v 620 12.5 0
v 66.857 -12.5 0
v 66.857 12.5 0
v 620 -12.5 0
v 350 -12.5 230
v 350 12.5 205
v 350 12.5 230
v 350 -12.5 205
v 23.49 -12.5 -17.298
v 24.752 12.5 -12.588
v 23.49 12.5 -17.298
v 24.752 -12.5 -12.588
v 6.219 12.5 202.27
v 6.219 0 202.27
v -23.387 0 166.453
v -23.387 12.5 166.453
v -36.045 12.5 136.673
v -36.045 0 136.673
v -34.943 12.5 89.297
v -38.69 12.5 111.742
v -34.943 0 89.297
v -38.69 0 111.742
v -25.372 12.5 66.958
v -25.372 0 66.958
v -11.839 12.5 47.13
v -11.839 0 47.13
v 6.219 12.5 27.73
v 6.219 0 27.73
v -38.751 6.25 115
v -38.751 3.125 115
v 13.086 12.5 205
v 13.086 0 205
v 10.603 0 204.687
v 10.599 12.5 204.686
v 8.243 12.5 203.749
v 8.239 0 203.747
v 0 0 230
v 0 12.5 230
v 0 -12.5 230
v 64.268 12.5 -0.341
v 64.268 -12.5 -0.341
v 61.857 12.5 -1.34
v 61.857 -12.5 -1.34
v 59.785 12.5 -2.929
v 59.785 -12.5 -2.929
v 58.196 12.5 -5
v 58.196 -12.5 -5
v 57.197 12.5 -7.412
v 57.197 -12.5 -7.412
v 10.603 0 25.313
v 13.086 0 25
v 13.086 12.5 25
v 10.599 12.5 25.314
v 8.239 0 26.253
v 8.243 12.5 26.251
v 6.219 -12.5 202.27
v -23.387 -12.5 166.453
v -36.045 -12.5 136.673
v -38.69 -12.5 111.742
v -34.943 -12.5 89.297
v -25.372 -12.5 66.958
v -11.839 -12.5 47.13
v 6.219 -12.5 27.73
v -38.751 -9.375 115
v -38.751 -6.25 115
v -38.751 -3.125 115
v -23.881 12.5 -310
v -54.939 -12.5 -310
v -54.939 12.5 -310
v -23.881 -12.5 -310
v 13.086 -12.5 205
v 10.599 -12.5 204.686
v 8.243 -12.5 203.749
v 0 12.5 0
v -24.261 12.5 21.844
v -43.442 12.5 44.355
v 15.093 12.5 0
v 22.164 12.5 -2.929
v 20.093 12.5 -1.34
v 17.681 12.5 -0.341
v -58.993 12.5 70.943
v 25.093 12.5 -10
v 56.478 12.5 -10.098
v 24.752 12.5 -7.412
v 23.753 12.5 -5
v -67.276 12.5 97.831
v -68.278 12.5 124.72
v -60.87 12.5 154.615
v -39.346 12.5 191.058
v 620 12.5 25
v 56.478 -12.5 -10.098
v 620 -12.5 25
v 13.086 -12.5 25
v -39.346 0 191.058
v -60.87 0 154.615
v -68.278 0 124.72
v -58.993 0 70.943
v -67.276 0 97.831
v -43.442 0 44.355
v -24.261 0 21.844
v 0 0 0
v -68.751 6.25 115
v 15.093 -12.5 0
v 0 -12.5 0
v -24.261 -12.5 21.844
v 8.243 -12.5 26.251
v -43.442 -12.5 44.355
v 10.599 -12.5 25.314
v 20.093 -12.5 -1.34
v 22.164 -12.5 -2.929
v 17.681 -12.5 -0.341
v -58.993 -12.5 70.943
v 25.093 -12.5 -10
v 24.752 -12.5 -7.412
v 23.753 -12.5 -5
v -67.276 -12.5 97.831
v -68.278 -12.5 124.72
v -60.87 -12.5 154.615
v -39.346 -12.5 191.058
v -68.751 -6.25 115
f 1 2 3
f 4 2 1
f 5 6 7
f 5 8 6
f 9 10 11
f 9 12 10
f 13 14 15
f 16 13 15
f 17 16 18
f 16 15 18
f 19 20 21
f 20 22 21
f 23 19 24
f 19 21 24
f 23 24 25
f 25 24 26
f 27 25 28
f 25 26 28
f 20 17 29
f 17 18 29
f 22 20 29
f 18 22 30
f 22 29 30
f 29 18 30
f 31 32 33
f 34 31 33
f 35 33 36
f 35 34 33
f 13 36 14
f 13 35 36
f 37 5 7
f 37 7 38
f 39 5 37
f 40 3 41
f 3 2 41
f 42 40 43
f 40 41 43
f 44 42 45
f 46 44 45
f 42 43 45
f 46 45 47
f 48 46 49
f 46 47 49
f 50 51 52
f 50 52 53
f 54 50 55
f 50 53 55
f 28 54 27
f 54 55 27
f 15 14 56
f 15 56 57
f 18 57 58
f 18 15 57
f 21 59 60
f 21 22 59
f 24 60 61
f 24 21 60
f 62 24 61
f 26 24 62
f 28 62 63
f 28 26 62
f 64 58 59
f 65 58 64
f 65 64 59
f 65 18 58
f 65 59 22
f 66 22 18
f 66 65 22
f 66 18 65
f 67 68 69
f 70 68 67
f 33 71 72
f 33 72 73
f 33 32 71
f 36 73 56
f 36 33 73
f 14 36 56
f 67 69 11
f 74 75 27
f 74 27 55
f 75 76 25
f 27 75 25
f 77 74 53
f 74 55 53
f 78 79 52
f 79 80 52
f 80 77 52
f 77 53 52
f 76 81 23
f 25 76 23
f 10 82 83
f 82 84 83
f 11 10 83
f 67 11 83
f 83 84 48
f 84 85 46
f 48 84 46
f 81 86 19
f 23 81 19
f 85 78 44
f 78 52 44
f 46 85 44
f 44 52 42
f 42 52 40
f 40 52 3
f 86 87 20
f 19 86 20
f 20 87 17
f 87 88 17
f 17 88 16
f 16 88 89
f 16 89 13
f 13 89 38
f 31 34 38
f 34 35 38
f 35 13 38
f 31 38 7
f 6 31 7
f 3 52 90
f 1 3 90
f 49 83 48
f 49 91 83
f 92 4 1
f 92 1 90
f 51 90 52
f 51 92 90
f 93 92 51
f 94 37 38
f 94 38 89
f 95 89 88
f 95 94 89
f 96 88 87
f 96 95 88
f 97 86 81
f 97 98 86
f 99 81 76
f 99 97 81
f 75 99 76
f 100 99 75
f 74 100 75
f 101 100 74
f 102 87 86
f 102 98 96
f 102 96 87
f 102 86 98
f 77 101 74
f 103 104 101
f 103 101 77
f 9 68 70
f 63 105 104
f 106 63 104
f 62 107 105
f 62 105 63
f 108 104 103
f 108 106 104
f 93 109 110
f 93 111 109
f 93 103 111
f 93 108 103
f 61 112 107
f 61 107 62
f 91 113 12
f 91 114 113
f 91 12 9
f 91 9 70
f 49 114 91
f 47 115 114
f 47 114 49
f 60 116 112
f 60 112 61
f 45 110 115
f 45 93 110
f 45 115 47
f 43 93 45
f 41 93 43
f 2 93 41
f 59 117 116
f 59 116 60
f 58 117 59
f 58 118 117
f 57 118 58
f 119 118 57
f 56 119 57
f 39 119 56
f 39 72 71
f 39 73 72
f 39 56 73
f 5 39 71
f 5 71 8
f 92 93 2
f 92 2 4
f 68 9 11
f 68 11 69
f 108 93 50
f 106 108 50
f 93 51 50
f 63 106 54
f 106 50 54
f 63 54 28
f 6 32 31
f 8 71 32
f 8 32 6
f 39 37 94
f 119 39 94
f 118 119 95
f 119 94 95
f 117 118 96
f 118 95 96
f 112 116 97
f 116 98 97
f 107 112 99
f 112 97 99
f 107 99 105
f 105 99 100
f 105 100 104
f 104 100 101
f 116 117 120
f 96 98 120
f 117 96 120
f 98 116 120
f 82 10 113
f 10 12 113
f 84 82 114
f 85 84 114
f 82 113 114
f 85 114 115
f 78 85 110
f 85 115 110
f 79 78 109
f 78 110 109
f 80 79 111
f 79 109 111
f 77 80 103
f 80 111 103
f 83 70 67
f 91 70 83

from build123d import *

# Parameters (mm, degrees)
F1_DEPTH = 12.5
F2_R     = 10


with BuildPart() as f1:
    # F0 (on Front) → F1 (new body, symmetric)
    with BuildSketch(Plane.XZ):
        with BuildLine():
            Line((350, 230), (40.9729498071, 230))
            add(Edge.make_bspline(
                [(40.9729498071, 230), (23.1266754436, 217.7466324391), (9.1600259417, 205)],
                knots=[5.8517425134, 5.8517425134, 5.8517425134, 5.949769397, 5.949769397, 5.949769397], degree=2, weights=[1, 0.9987990817, 1]))
            Line((9.1600259417, 205), (350, 205))
            Line((350, 205), (350, 230))
        make_face()
        with BuildLine():
            add(Edge.make_bspline(
                [(-68.7509398502, 115), (-68.7509398502, 55.2165740433), (0, 0)],
                knots=[0, 0, 0, 0.393402632, 0.393402632, 0.393402632], degree=2, weights=[1, 0.9807165918, 1]))
            Line((0, 0), (28.125, 0))
            Line((28.125, 0), (40.9729498071, 0))
            add(Edge.make_bspline(
                [(9.1600259417, 25), (23.1266754436, 12.2533675609), (40.9729498071, 0)],
                knots=[0.3334159102, 0.3334159102, 0.3334159102, 0.4314427937, 0.4314427937, 0.4314427937], degree=2, weights=[1, 0.9987990817, 1]))
            add(Edge.make_bspline(
                [(-38.7509398502, 115), (-38.7509398502, 68.7258392336), (9.1600259417, 25)],
                knots=[0, 0, 0, 0.3334159102, 0.3334159102, 0.3334159102], degree=2, weights=[1, 0.9861363811, 1]))
            add(Edge.make_bspline(
                [(9.1600259417, 205), (-38.7509398502, 161.2741607664), (-38.7509398502, 115)],
                knots=[5.949769397, 5.949769397, 5.949769397, 6.2831853072, 6.2831853072, 6.2831853072], degree=2, weights=[1, 0.9861363811, 1]))
            add(Edge.make_bspline(
                [(40.9729498071, 230), (23.1266754436, 217.7466324391), (9.1600259417, 205)],
                knots=[5.8517425134, 5.8517425134, 5.8517425134, 5.949769397, 5.949769397, 5.949769397], degree=2, weights=[1, 0.9987990817, 1]))
            Line((40.9729498071, 230), (0, 230))
            add(Edge.make_bspline(
                [(0, 230), (-68.7509398502, 174.7834259567), (-68.7509398502, 115)],
                knots=[5.8897826752, 5.8897826752, 5.8897826752, 6.2831853072, 6.2831853072, 6.2831853072], degree=2, weights=[1, 0.9807165918, 1]))
        make_face()
        with BuildLine():
            add(Edge.make_bspline(
                [(9.1600259417, 25), (23.1266754436, 12.2533675609), (40.9729498071, 0)],
                knots=[0.3334159102, 0.3334159102, 0.3334159102, 0.4314427937, 0.4314427937, 0.4314427937], degree=2, weights=[1, 0.9987990817, 1]))
            Line((40.9729498071, 0), (59.1832854123, 0))
            Line((59.1832854123, 0), (620, 0))
            Line((620, 0), (620, 25))
            Line((620, 25), (9.1600259417, 25))
        make_face()
        with BuildLine():
            Line((40.9729498071, 0), (28.125, 0))
            Line((28.125, 0), (23.4899694027, -17.2981696839))
            add(Edge.make_bspline(
                [(23.4899694027, -17.2981696839), (35.9947939251, -25.7814361907), (50.0769032841, -33.9854807757)],
                knots=[0.4567057683, 0.4567057683, 0.4567057683, 0.5196982713, 0.5196982713, 0.5196982713], degree=2, weights=[1, 0.9995040341, 1]))
            Line((50.0769032841, -33.9854807757), (56.4775823084, -10.0978214541))
            add(Edge.make_bspline(
                [(40.9729498071, 0), (48.3992260092, -5.0989293373), (56.4775823084, -10.0978214541)],
                knots=[0.4314427937, 0.4314427937, 0.4314427937, 0.4722612324, 0.4722612324, 0.4722612324], degree=2, weights=[1, 0.9997917391, 1]))
        make_face()
        with BuildLine():
            add(Edge.make_bspline(
                [(23.4899694027, -17.2981696839), (35.9947939251, -25.7814361907), (50.0769032841, -33.9854807757)],
                knots=[0.4567057683, 0.4567057683, 0.4567057683, 0.5196982713, 0.5196982713, 0.5196982713], degree=2, weights=[1, 0.9995040341, 1]))
            Line((23.4899694027, -17.2981696839), (-54.9392496536, -310))
            Line((-54.9392496536, -310), (-23.8809642413, -310))
            Line((-23.8809642413, -310), (50.0769032841, -33.9854807757))
        make_face()
        with BuildLine():
            Line((59.1832854123, 0), (40.9729498071, 0))
            add(Edge.make_bspline(
                [(40.9729498071, 0), (48.3992260092, -5.0989293373), (56.4775823084, -10.0978214541)],
                knots=[0.4314427937, 0.4314427937, 0.4314427937, 0.4722612324, 0.4722612324, 0.4722612324], degree=2, weights=[1, 0.9997917391, 1]))
            Line((56.4775823084, -10.0978214541), (59.1832854123, 0))
        make_face()
    extrude(amount=F1_DEPTH, both=True)

    # F2
    f2_edges = [f1.edges().sort_by_distance(p)[0] for p in [
        (9.160026, 6.25, 25),
        (9.160026, -6.25, 25),
        (9.160026, 6.25, 205),
        (9.160026, -6.25, 205),
        (59.183285, 0, 0),
        (28.125, 0, 0),
    ]]
    fillet(f2_edges, radius=F2_R)


solid = f1.part
